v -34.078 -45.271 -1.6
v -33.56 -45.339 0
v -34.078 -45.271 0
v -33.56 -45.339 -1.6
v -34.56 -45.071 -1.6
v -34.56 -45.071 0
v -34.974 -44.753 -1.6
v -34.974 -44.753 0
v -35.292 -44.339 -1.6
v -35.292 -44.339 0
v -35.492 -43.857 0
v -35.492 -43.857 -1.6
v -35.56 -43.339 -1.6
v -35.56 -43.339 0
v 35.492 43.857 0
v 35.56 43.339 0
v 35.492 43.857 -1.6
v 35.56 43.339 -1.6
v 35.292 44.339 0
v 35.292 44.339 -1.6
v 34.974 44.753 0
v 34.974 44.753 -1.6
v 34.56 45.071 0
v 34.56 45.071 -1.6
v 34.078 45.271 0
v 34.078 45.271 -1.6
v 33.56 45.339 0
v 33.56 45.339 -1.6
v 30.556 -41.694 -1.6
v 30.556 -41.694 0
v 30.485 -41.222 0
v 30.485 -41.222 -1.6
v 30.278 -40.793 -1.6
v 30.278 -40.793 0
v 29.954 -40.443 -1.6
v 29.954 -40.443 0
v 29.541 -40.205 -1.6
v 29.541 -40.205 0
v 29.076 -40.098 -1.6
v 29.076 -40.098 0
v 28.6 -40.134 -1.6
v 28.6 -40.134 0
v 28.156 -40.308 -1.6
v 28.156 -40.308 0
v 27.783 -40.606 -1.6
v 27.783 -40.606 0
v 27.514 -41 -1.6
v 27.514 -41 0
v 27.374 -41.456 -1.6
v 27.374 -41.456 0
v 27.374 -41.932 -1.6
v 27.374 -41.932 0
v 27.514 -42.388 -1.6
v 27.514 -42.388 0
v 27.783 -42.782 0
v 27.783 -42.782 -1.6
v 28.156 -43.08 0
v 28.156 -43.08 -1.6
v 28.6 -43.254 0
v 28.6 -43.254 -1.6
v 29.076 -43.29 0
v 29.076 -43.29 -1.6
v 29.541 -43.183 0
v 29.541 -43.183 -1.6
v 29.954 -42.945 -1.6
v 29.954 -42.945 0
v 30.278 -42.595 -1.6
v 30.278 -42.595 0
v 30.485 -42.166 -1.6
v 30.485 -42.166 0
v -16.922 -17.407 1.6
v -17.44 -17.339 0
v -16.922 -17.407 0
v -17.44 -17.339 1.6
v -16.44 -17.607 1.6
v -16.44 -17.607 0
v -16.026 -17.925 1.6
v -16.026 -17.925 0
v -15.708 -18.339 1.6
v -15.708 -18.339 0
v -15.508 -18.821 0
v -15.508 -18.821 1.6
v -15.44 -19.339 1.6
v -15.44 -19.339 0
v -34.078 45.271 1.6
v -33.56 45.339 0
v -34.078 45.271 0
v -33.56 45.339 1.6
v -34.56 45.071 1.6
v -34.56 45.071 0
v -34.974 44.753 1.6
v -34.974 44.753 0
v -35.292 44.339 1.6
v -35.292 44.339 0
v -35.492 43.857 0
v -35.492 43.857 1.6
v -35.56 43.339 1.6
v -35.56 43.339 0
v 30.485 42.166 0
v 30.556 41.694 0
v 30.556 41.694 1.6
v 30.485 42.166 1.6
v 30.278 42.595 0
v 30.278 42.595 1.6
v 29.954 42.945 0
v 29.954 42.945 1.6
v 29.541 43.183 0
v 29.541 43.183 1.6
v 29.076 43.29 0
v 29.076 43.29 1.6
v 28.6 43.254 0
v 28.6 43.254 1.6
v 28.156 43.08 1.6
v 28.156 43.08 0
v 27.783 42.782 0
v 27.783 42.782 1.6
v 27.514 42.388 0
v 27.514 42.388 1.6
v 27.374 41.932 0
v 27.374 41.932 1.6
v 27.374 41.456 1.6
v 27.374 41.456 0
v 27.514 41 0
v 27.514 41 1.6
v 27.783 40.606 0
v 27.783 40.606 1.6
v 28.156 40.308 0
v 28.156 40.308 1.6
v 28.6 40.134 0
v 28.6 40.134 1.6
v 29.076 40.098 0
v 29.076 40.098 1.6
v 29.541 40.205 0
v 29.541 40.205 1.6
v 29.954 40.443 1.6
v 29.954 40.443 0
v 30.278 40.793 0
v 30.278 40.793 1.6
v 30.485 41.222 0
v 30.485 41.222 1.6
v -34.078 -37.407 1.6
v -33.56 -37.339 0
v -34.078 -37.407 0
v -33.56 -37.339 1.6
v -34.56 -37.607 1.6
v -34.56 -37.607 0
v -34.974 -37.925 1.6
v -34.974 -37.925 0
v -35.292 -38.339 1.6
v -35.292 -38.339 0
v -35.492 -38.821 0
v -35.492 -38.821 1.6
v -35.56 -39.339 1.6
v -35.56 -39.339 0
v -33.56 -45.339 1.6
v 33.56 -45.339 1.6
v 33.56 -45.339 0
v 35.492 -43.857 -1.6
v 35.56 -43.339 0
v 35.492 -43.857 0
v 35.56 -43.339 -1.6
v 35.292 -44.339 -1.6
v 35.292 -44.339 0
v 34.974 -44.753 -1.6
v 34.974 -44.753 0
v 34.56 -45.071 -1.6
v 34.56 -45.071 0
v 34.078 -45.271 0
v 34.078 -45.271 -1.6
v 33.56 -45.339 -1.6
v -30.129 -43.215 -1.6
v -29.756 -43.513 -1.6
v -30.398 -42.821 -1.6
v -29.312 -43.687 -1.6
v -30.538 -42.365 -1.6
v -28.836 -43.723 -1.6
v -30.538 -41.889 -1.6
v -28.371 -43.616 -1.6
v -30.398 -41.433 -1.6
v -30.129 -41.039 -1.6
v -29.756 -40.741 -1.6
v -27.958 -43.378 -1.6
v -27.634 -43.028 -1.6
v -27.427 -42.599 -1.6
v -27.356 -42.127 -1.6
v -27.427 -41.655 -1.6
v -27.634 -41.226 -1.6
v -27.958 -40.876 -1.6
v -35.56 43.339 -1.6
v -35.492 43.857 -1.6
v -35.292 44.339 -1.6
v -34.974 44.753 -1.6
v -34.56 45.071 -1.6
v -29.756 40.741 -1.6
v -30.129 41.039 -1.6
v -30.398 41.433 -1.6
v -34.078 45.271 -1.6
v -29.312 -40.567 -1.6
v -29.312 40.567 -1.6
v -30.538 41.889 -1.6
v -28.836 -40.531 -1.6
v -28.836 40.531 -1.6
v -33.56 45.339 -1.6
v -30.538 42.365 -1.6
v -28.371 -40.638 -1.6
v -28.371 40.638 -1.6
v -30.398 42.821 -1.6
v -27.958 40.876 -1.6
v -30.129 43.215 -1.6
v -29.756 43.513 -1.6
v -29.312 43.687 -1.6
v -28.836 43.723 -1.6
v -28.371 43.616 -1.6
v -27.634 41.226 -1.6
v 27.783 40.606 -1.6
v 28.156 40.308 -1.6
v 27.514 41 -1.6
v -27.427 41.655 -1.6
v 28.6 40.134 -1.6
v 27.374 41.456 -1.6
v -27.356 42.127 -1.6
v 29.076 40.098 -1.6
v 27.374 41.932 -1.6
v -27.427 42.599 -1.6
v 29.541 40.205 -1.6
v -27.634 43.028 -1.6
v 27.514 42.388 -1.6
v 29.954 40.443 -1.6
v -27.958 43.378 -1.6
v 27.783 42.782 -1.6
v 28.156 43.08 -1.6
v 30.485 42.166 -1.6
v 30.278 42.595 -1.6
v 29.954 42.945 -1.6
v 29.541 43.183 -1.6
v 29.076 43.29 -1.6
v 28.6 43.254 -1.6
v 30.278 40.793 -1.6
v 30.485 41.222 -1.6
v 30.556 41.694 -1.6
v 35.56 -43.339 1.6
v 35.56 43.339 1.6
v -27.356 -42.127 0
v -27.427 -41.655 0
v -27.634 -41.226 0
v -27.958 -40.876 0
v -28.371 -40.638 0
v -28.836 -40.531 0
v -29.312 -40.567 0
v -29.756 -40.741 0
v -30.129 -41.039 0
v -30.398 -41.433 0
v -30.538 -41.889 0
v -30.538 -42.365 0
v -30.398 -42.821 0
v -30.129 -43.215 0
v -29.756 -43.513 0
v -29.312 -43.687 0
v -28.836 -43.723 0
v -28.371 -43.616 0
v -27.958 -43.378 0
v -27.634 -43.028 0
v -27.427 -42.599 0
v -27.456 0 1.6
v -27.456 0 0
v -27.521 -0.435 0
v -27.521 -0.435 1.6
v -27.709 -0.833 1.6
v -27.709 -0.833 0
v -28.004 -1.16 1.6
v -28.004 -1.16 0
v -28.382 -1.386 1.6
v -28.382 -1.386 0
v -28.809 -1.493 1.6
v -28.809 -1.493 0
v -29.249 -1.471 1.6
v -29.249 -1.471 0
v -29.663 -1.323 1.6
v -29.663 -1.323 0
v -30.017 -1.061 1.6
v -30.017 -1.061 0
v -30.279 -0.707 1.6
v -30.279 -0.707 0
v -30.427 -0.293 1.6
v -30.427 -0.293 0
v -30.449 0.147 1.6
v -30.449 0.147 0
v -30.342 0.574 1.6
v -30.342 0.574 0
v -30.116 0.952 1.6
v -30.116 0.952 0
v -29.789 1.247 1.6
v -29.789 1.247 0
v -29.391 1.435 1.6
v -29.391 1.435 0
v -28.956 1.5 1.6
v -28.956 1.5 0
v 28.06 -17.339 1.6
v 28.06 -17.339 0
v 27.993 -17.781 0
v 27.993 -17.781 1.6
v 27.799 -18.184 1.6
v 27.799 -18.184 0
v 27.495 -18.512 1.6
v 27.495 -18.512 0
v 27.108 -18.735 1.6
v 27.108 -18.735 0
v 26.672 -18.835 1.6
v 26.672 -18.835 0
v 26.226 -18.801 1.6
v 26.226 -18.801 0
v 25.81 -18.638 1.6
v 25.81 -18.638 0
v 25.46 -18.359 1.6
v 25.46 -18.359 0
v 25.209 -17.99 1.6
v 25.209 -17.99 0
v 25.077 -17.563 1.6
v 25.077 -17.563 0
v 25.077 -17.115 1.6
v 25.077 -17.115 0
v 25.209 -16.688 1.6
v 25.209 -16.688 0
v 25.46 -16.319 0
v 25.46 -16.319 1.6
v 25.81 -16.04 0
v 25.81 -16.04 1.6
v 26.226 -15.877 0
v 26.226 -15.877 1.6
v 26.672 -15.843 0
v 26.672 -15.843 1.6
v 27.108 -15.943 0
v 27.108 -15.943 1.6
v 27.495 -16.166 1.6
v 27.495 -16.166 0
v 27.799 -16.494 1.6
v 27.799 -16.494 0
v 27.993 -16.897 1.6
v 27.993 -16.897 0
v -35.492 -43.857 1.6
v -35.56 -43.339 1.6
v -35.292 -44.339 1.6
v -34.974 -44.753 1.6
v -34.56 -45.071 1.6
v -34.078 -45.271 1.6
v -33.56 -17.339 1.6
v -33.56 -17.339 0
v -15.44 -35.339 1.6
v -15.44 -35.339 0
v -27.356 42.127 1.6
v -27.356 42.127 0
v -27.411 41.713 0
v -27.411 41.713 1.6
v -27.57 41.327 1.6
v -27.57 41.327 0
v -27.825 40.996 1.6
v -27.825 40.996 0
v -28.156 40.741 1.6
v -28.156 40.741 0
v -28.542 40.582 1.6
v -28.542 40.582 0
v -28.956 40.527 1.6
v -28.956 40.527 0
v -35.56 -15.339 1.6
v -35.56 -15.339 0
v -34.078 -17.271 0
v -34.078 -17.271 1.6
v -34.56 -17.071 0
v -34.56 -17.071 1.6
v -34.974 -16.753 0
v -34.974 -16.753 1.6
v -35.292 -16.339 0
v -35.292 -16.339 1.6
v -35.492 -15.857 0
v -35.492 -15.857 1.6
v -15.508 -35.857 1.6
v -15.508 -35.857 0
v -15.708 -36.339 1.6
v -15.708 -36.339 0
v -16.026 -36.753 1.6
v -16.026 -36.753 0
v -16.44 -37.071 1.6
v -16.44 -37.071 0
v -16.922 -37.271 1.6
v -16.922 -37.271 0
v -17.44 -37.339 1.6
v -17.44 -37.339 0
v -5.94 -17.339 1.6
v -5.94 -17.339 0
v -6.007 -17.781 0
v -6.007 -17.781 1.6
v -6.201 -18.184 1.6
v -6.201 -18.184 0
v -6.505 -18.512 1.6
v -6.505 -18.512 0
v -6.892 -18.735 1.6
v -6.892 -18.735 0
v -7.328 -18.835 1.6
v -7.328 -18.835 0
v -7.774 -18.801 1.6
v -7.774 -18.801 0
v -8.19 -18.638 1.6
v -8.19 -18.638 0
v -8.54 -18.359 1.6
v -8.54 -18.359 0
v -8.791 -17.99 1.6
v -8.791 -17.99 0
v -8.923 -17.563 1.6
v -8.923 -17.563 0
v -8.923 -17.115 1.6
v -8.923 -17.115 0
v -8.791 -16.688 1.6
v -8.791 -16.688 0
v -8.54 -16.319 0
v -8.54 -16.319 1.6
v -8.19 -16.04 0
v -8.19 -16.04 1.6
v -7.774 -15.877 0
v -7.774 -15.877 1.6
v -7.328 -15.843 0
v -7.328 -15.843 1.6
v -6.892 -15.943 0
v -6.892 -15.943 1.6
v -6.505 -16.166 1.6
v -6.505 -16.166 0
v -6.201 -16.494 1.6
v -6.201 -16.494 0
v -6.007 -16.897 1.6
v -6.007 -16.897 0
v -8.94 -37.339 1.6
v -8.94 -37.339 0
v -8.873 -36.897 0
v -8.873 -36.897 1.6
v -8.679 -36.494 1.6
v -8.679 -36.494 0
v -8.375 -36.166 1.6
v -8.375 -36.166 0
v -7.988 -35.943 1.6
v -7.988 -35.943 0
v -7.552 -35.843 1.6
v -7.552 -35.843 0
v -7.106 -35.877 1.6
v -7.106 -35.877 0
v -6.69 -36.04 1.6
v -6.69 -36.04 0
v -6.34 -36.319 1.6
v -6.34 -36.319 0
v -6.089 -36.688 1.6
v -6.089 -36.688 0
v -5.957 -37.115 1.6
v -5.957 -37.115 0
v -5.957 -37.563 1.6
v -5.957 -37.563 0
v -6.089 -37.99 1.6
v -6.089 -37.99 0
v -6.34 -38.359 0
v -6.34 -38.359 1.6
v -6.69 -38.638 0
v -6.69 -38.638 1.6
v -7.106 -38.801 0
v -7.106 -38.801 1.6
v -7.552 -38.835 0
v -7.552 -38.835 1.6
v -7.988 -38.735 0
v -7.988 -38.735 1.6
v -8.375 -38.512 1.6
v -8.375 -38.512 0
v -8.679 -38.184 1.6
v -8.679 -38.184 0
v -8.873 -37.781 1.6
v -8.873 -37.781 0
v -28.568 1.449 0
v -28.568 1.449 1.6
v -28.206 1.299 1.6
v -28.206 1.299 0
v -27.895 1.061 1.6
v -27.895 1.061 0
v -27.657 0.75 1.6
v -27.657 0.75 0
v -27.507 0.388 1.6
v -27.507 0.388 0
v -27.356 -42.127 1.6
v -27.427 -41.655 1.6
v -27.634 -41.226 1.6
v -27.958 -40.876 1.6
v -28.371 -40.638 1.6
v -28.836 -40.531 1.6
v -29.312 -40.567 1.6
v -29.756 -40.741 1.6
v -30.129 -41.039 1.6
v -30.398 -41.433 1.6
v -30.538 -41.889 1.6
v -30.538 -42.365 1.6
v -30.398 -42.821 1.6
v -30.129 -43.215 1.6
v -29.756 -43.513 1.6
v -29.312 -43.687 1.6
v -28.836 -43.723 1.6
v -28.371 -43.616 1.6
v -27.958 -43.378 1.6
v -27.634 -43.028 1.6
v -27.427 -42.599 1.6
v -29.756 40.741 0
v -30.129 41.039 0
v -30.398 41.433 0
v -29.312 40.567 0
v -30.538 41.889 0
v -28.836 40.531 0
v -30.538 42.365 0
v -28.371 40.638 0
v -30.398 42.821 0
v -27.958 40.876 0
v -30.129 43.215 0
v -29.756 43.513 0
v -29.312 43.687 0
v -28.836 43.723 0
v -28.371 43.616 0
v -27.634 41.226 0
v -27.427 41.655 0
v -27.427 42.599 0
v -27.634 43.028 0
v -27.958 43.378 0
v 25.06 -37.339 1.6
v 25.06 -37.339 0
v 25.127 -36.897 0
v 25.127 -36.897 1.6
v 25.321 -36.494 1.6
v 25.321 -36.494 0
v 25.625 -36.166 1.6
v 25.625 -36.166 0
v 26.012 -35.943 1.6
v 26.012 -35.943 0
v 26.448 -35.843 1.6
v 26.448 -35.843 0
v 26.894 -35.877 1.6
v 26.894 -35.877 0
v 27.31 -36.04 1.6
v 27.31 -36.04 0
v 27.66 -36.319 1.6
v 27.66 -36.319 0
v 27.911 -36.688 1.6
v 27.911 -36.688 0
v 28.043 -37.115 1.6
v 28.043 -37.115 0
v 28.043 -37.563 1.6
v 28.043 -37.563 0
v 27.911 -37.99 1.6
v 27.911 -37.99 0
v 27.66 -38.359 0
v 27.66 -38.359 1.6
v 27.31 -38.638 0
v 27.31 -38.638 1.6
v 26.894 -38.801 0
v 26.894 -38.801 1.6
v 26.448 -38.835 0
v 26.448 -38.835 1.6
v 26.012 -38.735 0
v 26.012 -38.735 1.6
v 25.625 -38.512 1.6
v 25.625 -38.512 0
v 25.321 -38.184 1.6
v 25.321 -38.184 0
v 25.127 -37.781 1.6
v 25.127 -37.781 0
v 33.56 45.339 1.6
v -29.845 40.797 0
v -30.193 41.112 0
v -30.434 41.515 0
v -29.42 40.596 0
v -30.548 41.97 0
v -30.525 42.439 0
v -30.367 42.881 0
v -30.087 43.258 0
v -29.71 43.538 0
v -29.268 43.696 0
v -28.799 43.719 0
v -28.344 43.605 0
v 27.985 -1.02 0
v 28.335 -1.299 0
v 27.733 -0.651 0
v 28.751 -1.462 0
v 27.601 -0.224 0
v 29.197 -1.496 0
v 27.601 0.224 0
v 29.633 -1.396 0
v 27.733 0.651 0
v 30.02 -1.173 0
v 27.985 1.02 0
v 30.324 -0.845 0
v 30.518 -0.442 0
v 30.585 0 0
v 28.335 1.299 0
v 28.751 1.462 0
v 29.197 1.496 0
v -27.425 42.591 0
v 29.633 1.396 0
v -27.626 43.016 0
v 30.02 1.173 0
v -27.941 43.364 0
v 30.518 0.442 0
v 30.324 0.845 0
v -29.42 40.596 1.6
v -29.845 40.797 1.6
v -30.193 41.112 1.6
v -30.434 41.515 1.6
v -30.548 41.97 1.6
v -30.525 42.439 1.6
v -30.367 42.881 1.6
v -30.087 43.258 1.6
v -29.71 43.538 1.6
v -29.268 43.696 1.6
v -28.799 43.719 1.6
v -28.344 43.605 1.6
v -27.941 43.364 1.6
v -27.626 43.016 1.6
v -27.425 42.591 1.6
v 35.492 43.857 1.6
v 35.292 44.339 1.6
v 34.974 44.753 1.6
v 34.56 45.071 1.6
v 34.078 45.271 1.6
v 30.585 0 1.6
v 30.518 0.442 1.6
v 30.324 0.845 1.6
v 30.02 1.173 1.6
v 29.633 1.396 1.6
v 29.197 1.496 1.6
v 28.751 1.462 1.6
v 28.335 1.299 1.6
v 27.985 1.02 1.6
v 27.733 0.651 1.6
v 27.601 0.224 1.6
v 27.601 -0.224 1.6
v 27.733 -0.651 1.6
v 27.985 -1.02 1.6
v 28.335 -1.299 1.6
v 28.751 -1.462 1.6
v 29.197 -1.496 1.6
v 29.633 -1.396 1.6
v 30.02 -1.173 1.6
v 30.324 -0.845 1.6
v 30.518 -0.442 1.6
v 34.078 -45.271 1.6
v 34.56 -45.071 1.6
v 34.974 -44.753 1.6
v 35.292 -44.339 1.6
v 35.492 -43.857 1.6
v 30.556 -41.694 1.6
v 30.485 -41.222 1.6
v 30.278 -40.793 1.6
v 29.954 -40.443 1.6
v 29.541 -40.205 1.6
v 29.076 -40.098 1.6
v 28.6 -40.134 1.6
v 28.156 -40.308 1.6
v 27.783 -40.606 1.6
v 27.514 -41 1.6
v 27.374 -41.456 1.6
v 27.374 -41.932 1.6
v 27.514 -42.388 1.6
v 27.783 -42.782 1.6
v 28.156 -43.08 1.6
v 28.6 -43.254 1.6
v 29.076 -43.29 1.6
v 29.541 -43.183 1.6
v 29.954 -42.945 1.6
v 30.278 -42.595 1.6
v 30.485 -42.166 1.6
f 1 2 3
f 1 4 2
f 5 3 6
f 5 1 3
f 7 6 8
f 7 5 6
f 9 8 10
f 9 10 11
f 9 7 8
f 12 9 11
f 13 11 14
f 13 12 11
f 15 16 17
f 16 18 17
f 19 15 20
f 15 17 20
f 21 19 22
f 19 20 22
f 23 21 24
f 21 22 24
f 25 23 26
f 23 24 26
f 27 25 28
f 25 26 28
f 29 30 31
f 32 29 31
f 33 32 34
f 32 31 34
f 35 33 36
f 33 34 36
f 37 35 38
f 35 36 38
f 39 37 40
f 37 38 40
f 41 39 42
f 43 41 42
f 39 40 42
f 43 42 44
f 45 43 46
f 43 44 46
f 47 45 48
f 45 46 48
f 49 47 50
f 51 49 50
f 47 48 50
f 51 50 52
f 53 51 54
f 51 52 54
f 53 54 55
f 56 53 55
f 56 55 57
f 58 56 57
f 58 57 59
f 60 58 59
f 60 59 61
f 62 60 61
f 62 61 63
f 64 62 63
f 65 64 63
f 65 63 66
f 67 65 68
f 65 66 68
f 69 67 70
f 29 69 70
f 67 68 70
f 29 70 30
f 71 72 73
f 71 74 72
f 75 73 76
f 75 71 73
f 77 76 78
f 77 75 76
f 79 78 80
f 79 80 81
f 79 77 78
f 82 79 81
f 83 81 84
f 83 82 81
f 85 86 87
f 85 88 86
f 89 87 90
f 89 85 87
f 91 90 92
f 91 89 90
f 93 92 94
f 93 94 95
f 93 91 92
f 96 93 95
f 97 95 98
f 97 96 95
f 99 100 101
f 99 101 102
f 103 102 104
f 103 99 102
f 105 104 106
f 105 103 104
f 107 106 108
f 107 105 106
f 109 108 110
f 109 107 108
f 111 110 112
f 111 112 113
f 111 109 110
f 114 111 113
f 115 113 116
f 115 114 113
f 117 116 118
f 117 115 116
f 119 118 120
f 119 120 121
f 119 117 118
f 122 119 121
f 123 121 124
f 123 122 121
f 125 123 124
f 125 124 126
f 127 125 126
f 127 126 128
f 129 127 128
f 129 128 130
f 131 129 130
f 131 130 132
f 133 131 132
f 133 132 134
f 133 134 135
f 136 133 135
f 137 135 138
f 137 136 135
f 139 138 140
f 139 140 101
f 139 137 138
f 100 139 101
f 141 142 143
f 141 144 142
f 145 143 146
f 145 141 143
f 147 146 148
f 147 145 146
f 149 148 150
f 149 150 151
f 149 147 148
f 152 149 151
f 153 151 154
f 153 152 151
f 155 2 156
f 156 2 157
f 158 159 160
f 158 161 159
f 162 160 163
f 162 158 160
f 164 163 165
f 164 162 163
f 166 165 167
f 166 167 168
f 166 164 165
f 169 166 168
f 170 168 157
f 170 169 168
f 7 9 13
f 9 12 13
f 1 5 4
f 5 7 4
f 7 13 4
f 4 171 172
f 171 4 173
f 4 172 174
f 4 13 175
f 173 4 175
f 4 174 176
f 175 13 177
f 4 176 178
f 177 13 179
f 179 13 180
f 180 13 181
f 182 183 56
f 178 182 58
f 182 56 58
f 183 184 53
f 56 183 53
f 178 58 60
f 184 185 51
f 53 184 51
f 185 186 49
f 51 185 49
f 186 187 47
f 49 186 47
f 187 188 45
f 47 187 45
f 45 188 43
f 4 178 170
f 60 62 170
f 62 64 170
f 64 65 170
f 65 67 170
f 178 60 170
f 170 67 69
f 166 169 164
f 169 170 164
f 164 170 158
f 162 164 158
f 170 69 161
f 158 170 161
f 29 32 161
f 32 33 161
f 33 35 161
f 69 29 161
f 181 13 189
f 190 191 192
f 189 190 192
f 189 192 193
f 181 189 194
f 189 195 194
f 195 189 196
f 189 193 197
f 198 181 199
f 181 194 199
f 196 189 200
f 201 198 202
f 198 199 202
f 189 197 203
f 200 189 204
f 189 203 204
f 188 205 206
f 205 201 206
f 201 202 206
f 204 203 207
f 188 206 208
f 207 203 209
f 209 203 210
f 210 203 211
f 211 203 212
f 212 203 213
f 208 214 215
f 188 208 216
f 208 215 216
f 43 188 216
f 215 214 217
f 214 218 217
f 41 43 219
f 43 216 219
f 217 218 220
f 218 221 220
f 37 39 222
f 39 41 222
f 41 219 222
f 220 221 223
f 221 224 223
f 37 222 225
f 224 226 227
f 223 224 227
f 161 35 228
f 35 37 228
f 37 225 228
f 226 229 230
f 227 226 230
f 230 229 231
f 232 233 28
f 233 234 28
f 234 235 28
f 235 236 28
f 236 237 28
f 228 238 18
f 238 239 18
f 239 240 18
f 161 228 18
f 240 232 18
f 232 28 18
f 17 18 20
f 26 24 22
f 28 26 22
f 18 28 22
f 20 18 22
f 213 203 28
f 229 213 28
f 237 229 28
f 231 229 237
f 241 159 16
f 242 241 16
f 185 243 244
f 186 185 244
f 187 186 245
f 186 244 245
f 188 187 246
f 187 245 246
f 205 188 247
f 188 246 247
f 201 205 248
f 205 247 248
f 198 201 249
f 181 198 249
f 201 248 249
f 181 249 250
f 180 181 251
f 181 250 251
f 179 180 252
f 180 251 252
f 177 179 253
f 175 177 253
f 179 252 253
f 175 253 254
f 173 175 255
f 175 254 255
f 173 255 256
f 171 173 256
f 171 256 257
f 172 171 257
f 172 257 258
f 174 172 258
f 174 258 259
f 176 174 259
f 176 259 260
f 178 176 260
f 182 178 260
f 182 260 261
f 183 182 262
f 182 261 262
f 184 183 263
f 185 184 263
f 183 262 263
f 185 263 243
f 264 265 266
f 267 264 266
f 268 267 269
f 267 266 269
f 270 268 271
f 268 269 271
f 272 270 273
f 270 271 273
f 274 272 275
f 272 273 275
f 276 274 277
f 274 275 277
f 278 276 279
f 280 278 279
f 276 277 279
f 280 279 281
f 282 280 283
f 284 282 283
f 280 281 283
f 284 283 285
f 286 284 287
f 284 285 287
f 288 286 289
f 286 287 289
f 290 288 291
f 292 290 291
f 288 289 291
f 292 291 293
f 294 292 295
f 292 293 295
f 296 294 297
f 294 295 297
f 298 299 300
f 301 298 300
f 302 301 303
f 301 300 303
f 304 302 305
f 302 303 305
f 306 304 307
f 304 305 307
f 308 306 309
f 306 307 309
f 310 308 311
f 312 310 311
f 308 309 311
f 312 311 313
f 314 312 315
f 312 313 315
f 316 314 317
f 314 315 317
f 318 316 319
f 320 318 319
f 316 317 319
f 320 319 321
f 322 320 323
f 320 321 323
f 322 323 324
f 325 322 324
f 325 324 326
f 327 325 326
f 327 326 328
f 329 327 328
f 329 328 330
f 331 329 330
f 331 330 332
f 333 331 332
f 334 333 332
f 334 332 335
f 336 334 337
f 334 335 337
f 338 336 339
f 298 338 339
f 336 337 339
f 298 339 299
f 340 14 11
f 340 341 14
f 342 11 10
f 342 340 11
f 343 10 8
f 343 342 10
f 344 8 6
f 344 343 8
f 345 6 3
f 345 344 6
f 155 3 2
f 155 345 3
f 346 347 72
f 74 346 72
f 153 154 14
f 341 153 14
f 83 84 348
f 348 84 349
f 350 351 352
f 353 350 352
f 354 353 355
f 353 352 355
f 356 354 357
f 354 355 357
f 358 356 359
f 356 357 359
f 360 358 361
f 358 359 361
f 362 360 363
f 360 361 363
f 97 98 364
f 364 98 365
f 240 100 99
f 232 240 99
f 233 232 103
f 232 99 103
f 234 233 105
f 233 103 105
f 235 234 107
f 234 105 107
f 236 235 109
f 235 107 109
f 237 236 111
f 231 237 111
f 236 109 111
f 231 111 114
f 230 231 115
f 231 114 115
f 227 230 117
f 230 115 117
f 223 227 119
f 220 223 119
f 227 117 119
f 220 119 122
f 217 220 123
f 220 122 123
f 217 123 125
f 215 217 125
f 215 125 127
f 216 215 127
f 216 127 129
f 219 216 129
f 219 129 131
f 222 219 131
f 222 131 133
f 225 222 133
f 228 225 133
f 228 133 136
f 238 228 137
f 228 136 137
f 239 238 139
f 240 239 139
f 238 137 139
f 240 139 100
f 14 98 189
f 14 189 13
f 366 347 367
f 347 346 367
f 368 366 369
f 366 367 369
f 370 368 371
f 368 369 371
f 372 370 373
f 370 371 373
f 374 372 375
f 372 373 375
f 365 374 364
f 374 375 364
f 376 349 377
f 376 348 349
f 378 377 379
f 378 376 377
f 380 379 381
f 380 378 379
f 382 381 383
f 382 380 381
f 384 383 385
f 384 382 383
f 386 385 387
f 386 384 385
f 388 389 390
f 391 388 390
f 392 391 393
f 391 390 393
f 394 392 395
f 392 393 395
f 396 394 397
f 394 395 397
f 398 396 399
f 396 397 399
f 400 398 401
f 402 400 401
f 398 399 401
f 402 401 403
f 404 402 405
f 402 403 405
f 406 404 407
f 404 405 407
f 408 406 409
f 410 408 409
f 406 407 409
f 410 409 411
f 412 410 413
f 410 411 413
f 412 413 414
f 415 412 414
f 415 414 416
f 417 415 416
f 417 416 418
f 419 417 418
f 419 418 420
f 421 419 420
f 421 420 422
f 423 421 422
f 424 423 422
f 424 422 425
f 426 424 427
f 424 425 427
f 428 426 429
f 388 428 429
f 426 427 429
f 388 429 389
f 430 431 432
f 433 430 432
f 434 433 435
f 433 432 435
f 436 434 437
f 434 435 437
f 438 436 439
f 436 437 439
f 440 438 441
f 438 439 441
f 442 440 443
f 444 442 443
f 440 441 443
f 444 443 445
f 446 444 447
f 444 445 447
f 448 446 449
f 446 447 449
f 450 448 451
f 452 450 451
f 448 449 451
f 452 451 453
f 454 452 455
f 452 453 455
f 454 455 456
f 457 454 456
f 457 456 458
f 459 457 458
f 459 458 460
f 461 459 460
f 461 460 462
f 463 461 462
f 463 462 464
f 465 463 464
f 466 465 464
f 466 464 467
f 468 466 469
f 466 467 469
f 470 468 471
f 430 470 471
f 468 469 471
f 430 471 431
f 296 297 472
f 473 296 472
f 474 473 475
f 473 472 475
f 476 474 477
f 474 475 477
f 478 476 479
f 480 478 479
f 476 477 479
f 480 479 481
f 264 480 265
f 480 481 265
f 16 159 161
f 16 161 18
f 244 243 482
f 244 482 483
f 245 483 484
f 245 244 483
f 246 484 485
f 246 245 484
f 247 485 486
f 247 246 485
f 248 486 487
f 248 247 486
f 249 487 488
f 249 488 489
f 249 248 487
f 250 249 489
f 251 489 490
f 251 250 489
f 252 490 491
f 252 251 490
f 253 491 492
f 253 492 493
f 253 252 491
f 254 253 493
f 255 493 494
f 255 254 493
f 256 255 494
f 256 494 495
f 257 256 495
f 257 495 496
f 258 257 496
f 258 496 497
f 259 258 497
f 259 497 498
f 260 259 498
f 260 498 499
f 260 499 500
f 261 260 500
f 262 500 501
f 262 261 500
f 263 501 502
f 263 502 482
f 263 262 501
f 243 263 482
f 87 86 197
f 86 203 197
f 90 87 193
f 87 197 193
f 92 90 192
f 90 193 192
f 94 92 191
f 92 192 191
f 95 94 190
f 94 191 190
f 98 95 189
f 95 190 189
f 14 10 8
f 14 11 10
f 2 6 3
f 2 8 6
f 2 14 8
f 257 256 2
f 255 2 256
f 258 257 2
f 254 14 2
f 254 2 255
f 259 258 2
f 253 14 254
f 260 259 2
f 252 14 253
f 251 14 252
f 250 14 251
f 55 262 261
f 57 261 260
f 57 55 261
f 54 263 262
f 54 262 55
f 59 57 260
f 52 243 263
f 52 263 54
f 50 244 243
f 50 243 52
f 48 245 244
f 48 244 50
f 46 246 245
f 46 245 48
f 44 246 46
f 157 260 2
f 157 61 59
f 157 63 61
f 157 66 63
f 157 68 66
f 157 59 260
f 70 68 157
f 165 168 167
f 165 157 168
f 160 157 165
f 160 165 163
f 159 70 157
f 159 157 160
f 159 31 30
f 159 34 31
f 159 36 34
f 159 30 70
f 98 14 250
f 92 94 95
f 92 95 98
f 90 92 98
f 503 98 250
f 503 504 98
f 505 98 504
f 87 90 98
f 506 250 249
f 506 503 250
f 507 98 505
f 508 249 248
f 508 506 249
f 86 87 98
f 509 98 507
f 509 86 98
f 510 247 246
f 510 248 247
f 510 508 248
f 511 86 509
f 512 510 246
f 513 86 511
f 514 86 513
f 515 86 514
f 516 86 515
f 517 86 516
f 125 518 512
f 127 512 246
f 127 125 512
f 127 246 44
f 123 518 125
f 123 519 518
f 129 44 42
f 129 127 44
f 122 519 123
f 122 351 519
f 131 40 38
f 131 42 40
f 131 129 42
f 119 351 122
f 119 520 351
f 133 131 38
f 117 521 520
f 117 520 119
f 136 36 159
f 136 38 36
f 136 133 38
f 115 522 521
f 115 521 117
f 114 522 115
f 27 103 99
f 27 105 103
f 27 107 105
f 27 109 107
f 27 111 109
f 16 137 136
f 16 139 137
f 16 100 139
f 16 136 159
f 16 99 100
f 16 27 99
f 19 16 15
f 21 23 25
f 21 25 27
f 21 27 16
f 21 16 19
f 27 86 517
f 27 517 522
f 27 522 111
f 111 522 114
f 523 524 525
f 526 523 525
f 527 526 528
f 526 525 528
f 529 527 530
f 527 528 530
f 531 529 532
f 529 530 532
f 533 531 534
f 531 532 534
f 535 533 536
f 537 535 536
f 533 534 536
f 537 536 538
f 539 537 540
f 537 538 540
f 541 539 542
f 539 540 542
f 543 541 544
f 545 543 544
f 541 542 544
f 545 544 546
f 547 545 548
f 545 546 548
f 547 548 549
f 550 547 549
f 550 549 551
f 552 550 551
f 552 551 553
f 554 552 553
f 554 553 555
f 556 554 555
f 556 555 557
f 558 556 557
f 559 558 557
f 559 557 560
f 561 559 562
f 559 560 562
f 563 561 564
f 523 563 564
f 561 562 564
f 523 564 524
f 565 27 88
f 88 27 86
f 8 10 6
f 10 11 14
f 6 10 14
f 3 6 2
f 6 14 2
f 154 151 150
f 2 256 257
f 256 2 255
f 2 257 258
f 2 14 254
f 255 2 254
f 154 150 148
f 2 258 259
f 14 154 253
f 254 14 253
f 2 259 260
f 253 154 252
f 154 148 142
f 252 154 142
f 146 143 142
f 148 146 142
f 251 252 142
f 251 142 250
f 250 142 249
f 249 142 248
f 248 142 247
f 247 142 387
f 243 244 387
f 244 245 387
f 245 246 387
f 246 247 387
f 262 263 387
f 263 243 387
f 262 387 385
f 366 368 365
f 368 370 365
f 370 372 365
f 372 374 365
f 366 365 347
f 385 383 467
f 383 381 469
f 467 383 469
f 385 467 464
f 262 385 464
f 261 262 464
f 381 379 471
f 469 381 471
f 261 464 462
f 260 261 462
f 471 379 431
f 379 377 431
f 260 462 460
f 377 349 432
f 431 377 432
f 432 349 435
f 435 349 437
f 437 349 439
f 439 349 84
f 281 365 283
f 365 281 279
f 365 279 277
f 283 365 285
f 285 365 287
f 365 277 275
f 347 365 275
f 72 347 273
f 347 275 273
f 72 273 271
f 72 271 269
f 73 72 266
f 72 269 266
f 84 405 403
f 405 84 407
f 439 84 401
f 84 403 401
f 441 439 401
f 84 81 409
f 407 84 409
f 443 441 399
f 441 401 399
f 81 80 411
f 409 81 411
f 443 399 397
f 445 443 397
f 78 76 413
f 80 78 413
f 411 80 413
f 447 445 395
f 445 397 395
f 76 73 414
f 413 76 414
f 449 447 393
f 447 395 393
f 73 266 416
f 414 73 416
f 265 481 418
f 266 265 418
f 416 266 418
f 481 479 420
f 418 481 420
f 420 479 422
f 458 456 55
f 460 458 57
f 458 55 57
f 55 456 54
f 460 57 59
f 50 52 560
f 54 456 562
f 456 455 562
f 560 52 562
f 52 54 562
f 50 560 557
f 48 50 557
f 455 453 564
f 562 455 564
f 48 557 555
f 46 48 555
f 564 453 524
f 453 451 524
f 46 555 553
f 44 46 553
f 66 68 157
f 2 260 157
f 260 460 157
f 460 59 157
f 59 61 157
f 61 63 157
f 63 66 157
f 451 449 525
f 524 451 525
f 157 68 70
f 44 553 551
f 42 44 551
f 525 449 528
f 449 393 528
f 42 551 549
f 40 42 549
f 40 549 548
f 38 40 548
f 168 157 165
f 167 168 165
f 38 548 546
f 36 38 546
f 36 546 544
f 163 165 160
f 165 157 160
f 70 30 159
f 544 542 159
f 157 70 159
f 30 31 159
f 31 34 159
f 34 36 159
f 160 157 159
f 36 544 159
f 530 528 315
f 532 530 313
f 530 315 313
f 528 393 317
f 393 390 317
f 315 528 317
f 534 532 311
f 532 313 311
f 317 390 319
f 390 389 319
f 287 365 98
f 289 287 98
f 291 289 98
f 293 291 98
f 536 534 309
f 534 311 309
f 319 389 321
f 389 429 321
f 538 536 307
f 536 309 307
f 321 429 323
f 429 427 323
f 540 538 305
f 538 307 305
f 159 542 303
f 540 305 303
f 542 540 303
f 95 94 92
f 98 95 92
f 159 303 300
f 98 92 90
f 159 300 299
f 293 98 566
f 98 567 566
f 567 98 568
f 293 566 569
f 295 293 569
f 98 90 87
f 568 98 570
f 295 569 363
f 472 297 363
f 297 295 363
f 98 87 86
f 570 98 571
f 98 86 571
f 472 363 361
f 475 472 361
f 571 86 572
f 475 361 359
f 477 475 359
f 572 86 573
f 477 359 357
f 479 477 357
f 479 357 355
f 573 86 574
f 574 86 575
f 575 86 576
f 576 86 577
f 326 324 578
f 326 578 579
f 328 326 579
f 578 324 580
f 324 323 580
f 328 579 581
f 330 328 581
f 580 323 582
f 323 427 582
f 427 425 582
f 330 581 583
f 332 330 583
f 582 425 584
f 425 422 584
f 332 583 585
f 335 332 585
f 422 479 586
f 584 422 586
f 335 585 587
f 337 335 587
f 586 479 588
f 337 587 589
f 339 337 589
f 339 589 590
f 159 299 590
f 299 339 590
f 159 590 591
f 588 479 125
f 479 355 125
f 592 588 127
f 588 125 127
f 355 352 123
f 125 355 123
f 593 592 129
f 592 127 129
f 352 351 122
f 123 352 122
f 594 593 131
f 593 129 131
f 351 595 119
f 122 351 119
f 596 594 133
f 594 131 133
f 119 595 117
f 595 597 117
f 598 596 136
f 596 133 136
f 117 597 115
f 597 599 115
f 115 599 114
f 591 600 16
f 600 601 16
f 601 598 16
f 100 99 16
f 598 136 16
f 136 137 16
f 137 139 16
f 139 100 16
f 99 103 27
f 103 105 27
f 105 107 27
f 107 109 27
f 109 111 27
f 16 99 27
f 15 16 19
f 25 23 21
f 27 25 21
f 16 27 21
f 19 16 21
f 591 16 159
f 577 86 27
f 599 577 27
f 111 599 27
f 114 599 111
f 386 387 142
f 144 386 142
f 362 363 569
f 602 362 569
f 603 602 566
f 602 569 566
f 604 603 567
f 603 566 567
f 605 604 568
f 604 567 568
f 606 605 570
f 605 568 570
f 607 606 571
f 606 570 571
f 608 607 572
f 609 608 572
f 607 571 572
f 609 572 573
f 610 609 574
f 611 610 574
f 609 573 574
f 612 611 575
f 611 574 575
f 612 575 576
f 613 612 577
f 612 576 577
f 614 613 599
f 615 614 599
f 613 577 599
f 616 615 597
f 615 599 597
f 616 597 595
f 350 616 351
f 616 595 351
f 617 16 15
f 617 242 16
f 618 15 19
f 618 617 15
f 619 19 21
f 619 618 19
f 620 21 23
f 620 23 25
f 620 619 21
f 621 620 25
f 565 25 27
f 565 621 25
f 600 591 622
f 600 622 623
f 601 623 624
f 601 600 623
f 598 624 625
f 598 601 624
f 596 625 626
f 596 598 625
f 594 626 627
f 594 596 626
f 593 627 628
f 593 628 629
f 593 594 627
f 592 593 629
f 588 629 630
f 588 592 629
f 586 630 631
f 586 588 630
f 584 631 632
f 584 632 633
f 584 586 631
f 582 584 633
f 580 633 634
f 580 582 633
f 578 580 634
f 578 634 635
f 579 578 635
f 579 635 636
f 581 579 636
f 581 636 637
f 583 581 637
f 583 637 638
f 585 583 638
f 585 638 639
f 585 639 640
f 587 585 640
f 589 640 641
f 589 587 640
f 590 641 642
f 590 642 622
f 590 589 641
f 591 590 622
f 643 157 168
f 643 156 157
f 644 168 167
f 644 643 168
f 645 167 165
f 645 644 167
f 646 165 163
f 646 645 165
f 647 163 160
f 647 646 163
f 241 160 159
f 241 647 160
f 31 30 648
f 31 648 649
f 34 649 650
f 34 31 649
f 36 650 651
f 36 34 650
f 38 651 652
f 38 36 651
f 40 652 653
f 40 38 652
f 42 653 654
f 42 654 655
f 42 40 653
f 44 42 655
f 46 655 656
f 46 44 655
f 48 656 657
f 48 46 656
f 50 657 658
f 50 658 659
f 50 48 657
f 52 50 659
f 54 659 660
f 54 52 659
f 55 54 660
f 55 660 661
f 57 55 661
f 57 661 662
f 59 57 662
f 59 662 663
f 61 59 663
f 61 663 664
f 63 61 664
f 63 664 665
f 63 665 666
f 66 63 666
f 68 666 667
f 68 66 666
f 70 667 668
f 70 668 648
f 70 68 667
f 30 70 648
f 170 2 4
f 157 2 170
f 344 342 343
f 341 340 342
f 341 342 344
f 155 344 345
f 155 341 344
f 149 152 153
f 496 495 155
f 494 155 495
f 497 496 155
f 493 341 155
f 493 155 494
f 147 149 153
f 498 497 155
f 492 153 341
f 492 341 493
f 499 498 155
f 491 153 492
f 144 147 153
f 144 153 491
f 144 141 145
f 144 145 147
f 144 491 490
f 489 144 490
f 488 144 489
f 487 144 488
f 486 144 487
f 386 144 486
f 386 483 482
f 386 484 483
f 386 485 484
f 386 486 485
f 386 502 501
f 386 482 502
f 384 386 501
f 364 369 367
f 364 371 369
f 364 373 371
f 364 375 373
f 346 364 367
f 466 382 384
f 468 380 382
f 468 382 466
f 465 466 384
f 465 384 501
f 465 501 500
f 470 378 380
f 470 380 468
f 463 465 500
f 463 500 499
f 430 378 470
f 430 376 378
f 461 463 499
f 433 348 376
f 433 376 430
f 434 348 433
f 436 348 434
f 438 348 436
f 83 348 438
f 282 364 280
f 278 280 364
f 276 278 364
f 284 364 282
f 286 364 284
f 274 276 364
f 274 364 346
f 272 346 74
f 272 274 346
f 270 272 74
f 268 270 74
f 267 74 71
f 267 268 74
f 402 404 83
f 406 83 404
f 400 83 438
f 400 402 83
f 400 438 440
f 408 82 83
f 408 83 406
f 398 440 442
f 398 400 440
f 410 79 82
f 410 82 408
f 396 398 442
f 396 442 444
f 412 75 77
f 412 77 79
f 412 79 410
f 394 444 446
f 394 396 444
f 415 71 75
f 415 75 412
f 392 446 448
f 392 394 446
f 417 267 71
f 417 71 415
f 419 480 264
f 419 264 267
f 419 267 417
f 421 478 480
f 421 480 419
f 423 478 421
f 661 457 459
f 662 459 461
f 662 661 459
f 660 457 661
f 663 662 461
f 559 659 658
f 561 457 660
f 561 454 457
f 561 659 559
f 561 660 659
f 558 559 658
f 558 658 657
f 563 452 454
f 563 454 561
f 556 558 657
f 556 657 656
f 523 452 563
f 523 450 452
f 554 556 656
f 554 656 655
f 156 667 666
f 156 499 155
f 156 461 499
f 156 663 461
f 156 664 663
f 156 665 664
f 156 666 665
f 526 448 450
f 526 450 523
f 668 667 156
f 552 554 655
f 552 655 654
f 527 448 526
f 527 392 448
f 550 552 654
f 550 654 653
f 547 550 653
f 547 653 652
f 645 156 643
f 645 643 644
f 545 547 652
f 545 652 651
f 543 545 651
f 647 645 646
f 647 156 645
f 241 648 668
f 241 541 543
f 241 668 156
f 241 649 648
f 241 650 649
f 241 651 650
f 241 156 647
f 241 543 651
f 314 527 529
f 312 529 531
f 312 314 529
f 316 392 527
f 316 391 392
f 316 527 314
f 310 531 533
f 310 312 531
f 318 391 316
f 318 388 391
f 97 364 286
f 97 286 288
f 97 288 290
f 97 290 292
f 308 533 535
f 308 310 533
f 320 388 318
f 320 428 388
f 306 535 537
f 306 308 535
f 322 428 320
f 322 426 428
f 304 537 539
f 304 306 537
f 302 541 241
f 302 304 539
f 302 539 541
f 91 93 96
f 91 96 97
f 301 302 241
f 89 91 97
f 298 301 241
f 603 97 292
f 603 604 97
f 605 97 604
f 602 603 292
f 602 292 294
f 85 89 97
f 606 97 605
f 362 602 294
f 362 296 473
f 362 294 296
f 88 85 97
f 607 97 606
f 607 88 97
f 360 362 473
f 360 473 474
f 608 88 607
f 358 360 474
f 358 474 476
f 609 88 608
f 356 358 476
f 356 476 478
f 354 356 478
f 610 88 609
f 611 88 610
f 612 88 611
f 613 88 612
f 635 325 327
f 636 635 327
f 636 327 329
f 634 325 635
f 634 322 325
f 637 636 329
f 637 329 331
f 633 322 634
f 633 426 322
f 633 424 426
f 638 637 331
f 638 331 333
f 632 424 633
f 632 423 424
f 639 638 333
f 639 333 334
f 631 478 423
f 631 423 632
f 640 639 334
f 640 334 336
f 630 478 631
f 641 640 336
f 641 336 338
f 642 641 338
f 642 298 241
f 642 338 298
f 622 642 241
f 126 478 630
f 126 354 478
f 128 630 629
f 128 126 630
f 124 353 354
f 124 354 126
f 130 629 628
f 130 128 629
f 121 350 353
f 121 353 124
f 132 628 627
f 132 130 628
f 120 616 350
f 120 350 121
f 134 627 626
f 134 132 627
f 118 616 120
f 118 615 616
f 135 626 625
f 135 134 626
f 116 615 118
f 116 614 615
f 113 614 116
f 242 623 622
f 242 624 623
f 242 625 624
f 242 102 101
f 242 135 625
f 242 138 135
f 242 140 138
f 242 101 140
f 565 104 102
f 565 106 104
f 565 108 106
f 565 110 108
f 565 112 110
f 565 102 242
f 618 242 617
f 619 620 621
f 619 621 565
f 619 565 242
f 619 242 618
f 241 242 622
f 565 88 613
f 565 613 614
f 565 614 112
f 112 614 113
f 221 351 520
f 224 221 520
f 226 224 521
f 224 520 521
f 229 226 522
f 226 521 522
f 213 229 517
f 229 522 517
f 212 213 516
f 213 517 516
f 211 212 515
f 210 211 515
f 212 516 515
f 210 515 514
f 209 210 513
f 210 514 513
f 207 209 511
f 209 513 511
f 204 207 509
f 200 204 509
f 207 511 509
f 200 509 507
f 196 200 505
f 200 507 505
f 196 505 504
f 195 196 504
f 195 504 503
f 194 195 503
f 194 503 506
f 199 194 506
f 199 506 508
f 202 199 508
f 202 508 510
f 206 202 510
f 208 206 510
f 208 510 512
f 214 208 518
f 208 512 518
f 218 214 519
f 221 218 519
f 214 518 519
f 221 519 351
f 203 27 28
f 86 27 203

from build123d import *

# Parameters (mm, degrees)
F0_R     = 1.6
F1_DEPTH = 1.6
F2_R     = 2
F3_R     = 1.6
F3_R_2   = 1.5
F4_DEPTH = 1.6
F5_R     = 2


# Not quite as in the source:
# - a feature names something its author has since deleted; it is built from what else it names


with BuildPart() as f1:
    # F0 (on Top) → F1 (new body)
    with BuildSketch(Plane.XY):
        Polygon((22.86, -45.339), (35.56, -45.339), (35.56, 45.339), (22.86, 45.339), (-22.86, 45.339), (-35.56, 45.339), (-35.56, -45.339), (-22.86, -45.339), align=None)
        with Locations((-28.956, -42.126997942)):
            Circle(F0_R, mode=Mode.SUBTRACT)
        with Locations((28.956, -41.694)):
            Circle(F0_R, mode=Mode.SUBTRACT)
        with Locations((-28.956, 42.126997942)):
            Circle(F0_R, mode=Mode.SUBTRACT)
        with Locations((28.956, 41.694)):
            Circle(F0_R, mode=Mode.SUBTRACT)
    extrude(amount=-F1_DEPTH)

    # F2
    f2_edges = [f1.edges().sort_by_distance(p)[0] for p in [
        (-35.56, 45.339, -0.8),
        (35.56, 45.339, -0.8),
        (-35.56, -45.339, -0.8),
        (35.56, -45.339, -0.8),
    ]]
    fillet(f2_edges, radius=F2_R)


with BuildPart() as f4:
    # F3 (on face) → F4 (new body)
    with BuildSketch(Plane.XY):
        with BuildLine():
            Line((-35.56, -17.339), (-19.8256308937, -17.339))
            Line((-19.8256308937, -17.339), (-15.44, -17.339))
            Line((-15.44, -17.339), (-8.94, -17.339))
            ThreePointArc((-8.94, -17.339), (-7.44, -15.839), (-5.94, -17.339))
            Line((-5.94, -17.339), (25.06, -17.339))
            ThreePointArc((25.06, -17.339), (26.56, -15.839), (28.06, -17.339))
            Line((28.06, -17.339), (34.56, -17.339))
            Line((34.56, -17.339), (34.56, -37.339))
            Line((34.56, -37.339), (28.06, -37.339))
            ThreePointArc((28.06, -37.339), (26.56, -38.839), (25.06, -37.339))
            Line((25.06, -37.339), (-5.94, -37.339))
            ThreePointArc((-5.94, -37.339), (-7.44, -38.839), (-8.94, -37.339))
            Line((-8.94, -37.339), (-15.44, -37.339))
            Line((-15.44, -37.339), (-35.56, -37.339))
            Line((-35.56, -37.339), (-35.56, -45.339))
            Line((-35.56, -45.339), (-22.86, -45.339))
            Line((-22.86, -45.339), (22.86, -45.339))
            Line((22.86, -45.339), (35.56, -45.339))
            Line((35.56, -45.339), (35.56, 45.339))
            Line((35.56, 45.339), (22.86, 45.339))
            Line((22.86, 45.339), (-22.86, 45.339))
            Line((-22.86, 45.339), (-35.56, 45.339))
            Line((-35.56, 45.339), (-35.56, -17.339))
        make_face()
        with Locations((-28.956, -42.126997942)):
            Circle(F3_R, mode=Mode.SUBTRACT)
        with BuildLine():
            ThreePointArc((-27.456, 0), (-30.0166601718, -1.0606601718), (-28.956, 1.5))
            ThreePointArc((-28.956, 1.5), (-27.8953398282, 1.0606601718), (-27.456, 0))
        make_face(mode=Mode.SUBTRACT)
        with Locations((28.956, -41.694)):
            Circle(F3_R, mode=Mode.SUBTRACT)
        with Locations((29.0846601129, 0)):
            Circle(F3_R_2, mode=Mode.SUBTRACT)
        with BuildLine():
            ThreePointArc((-27.356, 42.126997942), (-27.8246291501, 40.9956270921), (-28.956, 40.526997942))
            ThreePointArc((-28.956, 40.526997942), (-30.0873708499, 43.2583687919), (-27.356, 42.126997942))
        make_face(mode=Mode.SUBTRACT)
        with BuildLine():
            ThreePointArc((27.4999902592, 17.0231461525), (27.4999975648, 17.0115730773), (27.5, 17))
            ThreePointArc((27.5, 17), (13.75, -6.8156986041), (-13.75, -6.8156986041))
            ThreePointArc((-13.75, -6.8156986041), (-23.8214830338, 3.2600237965), (-27.4999902592, 17.0231461525))
            ThreePointArc((-27.4999902592, 17.0231461525), (0, 44.5), (27.4999902592, 17.0231461525))
        make_face(mode=Mode.SUBTRACT)
        with Locations((28.956, 41.694)):
            Circle(F3_R, mode=Mode.SUBTRACT)
        with BuildLine():
            ThreePointArc((-13.75, -6.8156986041), (13.75, -6.8156986041), (27.5, 17))
            ThreePointArc((27.5, 17), (27.4999975648, 17.0115730773), (27.4999902592, 17.0231461525))
            Line((27.4999902592, 17.0231461525), (-27.4999902592, 17.0231461525))
            ThreePointArc((-27.4999902592, 17.0231461525), (-23.8214830338, 3.2600237965), (-13.75, -6.8156986041))
        make_face()
        with BuildLine():
            Line((-27.4999902592, 17.0231461525), (27.4999902592, 17.0231461525))
            ThreePointArc((27.4999902592, 17.0231461525), (0, 44.5), (-27.4999902592, 17.0231461525))
        make_face()
        with BuildLine():
            Line((-8.94, -17.339), (-15.44, -17.339))
            Line((-15.44, -17.339), (-15.44, -37.339))
            Line((-15.44, -37.339), (-8.94, -37.339))
            ThreePointArc((-8.94, -37.339), (-7.44, -35.839), (-5.94, -37.339))
            Line((-5.94, -37.339), (25.06, -37.339))
            ThreePointArc((25.06, -37.339), (26.56, -35.839), (28.06, -37.339))
            Line((28.06, -37.339), (34.56, -37.339))
            Line((34.56, -37.339), (34.56, -17.339))
            Line((34.56, -17.339), (28.06, -17.339))
            ThreePointArc((28.06, -17.339), (26.56, -18.839), (25.06, -17.339))
            Line((25.06, -17.339), (-5.94, -17.339))
            ThreePointArc((-5.94, -17.339), (-7.44, -18.839), (-8.94, -17.339))
        make_face()
    extrude(amount=F4_DEPTH)

    # F5
    f5_edges = [f4.edges().sort_by_distance(p)[0] for p in [
        (-15.44, -17.339, 0.8),
        (-35.56, -17.339, 0.8),
        (-35.56, -37.339, 0.8),
        (-15.44, -37.339, 0.8),
        (-35.56, -45.339, 0.8),
        (35.56, 45.339, 0.8),
        (-35.56, 45.339, 0.8),
        (35.56, -45.339, 0.8),
    ]]
    fillet(f5_edges, radius=F5_R)


solid = Compound([f1.part, f4.part])
